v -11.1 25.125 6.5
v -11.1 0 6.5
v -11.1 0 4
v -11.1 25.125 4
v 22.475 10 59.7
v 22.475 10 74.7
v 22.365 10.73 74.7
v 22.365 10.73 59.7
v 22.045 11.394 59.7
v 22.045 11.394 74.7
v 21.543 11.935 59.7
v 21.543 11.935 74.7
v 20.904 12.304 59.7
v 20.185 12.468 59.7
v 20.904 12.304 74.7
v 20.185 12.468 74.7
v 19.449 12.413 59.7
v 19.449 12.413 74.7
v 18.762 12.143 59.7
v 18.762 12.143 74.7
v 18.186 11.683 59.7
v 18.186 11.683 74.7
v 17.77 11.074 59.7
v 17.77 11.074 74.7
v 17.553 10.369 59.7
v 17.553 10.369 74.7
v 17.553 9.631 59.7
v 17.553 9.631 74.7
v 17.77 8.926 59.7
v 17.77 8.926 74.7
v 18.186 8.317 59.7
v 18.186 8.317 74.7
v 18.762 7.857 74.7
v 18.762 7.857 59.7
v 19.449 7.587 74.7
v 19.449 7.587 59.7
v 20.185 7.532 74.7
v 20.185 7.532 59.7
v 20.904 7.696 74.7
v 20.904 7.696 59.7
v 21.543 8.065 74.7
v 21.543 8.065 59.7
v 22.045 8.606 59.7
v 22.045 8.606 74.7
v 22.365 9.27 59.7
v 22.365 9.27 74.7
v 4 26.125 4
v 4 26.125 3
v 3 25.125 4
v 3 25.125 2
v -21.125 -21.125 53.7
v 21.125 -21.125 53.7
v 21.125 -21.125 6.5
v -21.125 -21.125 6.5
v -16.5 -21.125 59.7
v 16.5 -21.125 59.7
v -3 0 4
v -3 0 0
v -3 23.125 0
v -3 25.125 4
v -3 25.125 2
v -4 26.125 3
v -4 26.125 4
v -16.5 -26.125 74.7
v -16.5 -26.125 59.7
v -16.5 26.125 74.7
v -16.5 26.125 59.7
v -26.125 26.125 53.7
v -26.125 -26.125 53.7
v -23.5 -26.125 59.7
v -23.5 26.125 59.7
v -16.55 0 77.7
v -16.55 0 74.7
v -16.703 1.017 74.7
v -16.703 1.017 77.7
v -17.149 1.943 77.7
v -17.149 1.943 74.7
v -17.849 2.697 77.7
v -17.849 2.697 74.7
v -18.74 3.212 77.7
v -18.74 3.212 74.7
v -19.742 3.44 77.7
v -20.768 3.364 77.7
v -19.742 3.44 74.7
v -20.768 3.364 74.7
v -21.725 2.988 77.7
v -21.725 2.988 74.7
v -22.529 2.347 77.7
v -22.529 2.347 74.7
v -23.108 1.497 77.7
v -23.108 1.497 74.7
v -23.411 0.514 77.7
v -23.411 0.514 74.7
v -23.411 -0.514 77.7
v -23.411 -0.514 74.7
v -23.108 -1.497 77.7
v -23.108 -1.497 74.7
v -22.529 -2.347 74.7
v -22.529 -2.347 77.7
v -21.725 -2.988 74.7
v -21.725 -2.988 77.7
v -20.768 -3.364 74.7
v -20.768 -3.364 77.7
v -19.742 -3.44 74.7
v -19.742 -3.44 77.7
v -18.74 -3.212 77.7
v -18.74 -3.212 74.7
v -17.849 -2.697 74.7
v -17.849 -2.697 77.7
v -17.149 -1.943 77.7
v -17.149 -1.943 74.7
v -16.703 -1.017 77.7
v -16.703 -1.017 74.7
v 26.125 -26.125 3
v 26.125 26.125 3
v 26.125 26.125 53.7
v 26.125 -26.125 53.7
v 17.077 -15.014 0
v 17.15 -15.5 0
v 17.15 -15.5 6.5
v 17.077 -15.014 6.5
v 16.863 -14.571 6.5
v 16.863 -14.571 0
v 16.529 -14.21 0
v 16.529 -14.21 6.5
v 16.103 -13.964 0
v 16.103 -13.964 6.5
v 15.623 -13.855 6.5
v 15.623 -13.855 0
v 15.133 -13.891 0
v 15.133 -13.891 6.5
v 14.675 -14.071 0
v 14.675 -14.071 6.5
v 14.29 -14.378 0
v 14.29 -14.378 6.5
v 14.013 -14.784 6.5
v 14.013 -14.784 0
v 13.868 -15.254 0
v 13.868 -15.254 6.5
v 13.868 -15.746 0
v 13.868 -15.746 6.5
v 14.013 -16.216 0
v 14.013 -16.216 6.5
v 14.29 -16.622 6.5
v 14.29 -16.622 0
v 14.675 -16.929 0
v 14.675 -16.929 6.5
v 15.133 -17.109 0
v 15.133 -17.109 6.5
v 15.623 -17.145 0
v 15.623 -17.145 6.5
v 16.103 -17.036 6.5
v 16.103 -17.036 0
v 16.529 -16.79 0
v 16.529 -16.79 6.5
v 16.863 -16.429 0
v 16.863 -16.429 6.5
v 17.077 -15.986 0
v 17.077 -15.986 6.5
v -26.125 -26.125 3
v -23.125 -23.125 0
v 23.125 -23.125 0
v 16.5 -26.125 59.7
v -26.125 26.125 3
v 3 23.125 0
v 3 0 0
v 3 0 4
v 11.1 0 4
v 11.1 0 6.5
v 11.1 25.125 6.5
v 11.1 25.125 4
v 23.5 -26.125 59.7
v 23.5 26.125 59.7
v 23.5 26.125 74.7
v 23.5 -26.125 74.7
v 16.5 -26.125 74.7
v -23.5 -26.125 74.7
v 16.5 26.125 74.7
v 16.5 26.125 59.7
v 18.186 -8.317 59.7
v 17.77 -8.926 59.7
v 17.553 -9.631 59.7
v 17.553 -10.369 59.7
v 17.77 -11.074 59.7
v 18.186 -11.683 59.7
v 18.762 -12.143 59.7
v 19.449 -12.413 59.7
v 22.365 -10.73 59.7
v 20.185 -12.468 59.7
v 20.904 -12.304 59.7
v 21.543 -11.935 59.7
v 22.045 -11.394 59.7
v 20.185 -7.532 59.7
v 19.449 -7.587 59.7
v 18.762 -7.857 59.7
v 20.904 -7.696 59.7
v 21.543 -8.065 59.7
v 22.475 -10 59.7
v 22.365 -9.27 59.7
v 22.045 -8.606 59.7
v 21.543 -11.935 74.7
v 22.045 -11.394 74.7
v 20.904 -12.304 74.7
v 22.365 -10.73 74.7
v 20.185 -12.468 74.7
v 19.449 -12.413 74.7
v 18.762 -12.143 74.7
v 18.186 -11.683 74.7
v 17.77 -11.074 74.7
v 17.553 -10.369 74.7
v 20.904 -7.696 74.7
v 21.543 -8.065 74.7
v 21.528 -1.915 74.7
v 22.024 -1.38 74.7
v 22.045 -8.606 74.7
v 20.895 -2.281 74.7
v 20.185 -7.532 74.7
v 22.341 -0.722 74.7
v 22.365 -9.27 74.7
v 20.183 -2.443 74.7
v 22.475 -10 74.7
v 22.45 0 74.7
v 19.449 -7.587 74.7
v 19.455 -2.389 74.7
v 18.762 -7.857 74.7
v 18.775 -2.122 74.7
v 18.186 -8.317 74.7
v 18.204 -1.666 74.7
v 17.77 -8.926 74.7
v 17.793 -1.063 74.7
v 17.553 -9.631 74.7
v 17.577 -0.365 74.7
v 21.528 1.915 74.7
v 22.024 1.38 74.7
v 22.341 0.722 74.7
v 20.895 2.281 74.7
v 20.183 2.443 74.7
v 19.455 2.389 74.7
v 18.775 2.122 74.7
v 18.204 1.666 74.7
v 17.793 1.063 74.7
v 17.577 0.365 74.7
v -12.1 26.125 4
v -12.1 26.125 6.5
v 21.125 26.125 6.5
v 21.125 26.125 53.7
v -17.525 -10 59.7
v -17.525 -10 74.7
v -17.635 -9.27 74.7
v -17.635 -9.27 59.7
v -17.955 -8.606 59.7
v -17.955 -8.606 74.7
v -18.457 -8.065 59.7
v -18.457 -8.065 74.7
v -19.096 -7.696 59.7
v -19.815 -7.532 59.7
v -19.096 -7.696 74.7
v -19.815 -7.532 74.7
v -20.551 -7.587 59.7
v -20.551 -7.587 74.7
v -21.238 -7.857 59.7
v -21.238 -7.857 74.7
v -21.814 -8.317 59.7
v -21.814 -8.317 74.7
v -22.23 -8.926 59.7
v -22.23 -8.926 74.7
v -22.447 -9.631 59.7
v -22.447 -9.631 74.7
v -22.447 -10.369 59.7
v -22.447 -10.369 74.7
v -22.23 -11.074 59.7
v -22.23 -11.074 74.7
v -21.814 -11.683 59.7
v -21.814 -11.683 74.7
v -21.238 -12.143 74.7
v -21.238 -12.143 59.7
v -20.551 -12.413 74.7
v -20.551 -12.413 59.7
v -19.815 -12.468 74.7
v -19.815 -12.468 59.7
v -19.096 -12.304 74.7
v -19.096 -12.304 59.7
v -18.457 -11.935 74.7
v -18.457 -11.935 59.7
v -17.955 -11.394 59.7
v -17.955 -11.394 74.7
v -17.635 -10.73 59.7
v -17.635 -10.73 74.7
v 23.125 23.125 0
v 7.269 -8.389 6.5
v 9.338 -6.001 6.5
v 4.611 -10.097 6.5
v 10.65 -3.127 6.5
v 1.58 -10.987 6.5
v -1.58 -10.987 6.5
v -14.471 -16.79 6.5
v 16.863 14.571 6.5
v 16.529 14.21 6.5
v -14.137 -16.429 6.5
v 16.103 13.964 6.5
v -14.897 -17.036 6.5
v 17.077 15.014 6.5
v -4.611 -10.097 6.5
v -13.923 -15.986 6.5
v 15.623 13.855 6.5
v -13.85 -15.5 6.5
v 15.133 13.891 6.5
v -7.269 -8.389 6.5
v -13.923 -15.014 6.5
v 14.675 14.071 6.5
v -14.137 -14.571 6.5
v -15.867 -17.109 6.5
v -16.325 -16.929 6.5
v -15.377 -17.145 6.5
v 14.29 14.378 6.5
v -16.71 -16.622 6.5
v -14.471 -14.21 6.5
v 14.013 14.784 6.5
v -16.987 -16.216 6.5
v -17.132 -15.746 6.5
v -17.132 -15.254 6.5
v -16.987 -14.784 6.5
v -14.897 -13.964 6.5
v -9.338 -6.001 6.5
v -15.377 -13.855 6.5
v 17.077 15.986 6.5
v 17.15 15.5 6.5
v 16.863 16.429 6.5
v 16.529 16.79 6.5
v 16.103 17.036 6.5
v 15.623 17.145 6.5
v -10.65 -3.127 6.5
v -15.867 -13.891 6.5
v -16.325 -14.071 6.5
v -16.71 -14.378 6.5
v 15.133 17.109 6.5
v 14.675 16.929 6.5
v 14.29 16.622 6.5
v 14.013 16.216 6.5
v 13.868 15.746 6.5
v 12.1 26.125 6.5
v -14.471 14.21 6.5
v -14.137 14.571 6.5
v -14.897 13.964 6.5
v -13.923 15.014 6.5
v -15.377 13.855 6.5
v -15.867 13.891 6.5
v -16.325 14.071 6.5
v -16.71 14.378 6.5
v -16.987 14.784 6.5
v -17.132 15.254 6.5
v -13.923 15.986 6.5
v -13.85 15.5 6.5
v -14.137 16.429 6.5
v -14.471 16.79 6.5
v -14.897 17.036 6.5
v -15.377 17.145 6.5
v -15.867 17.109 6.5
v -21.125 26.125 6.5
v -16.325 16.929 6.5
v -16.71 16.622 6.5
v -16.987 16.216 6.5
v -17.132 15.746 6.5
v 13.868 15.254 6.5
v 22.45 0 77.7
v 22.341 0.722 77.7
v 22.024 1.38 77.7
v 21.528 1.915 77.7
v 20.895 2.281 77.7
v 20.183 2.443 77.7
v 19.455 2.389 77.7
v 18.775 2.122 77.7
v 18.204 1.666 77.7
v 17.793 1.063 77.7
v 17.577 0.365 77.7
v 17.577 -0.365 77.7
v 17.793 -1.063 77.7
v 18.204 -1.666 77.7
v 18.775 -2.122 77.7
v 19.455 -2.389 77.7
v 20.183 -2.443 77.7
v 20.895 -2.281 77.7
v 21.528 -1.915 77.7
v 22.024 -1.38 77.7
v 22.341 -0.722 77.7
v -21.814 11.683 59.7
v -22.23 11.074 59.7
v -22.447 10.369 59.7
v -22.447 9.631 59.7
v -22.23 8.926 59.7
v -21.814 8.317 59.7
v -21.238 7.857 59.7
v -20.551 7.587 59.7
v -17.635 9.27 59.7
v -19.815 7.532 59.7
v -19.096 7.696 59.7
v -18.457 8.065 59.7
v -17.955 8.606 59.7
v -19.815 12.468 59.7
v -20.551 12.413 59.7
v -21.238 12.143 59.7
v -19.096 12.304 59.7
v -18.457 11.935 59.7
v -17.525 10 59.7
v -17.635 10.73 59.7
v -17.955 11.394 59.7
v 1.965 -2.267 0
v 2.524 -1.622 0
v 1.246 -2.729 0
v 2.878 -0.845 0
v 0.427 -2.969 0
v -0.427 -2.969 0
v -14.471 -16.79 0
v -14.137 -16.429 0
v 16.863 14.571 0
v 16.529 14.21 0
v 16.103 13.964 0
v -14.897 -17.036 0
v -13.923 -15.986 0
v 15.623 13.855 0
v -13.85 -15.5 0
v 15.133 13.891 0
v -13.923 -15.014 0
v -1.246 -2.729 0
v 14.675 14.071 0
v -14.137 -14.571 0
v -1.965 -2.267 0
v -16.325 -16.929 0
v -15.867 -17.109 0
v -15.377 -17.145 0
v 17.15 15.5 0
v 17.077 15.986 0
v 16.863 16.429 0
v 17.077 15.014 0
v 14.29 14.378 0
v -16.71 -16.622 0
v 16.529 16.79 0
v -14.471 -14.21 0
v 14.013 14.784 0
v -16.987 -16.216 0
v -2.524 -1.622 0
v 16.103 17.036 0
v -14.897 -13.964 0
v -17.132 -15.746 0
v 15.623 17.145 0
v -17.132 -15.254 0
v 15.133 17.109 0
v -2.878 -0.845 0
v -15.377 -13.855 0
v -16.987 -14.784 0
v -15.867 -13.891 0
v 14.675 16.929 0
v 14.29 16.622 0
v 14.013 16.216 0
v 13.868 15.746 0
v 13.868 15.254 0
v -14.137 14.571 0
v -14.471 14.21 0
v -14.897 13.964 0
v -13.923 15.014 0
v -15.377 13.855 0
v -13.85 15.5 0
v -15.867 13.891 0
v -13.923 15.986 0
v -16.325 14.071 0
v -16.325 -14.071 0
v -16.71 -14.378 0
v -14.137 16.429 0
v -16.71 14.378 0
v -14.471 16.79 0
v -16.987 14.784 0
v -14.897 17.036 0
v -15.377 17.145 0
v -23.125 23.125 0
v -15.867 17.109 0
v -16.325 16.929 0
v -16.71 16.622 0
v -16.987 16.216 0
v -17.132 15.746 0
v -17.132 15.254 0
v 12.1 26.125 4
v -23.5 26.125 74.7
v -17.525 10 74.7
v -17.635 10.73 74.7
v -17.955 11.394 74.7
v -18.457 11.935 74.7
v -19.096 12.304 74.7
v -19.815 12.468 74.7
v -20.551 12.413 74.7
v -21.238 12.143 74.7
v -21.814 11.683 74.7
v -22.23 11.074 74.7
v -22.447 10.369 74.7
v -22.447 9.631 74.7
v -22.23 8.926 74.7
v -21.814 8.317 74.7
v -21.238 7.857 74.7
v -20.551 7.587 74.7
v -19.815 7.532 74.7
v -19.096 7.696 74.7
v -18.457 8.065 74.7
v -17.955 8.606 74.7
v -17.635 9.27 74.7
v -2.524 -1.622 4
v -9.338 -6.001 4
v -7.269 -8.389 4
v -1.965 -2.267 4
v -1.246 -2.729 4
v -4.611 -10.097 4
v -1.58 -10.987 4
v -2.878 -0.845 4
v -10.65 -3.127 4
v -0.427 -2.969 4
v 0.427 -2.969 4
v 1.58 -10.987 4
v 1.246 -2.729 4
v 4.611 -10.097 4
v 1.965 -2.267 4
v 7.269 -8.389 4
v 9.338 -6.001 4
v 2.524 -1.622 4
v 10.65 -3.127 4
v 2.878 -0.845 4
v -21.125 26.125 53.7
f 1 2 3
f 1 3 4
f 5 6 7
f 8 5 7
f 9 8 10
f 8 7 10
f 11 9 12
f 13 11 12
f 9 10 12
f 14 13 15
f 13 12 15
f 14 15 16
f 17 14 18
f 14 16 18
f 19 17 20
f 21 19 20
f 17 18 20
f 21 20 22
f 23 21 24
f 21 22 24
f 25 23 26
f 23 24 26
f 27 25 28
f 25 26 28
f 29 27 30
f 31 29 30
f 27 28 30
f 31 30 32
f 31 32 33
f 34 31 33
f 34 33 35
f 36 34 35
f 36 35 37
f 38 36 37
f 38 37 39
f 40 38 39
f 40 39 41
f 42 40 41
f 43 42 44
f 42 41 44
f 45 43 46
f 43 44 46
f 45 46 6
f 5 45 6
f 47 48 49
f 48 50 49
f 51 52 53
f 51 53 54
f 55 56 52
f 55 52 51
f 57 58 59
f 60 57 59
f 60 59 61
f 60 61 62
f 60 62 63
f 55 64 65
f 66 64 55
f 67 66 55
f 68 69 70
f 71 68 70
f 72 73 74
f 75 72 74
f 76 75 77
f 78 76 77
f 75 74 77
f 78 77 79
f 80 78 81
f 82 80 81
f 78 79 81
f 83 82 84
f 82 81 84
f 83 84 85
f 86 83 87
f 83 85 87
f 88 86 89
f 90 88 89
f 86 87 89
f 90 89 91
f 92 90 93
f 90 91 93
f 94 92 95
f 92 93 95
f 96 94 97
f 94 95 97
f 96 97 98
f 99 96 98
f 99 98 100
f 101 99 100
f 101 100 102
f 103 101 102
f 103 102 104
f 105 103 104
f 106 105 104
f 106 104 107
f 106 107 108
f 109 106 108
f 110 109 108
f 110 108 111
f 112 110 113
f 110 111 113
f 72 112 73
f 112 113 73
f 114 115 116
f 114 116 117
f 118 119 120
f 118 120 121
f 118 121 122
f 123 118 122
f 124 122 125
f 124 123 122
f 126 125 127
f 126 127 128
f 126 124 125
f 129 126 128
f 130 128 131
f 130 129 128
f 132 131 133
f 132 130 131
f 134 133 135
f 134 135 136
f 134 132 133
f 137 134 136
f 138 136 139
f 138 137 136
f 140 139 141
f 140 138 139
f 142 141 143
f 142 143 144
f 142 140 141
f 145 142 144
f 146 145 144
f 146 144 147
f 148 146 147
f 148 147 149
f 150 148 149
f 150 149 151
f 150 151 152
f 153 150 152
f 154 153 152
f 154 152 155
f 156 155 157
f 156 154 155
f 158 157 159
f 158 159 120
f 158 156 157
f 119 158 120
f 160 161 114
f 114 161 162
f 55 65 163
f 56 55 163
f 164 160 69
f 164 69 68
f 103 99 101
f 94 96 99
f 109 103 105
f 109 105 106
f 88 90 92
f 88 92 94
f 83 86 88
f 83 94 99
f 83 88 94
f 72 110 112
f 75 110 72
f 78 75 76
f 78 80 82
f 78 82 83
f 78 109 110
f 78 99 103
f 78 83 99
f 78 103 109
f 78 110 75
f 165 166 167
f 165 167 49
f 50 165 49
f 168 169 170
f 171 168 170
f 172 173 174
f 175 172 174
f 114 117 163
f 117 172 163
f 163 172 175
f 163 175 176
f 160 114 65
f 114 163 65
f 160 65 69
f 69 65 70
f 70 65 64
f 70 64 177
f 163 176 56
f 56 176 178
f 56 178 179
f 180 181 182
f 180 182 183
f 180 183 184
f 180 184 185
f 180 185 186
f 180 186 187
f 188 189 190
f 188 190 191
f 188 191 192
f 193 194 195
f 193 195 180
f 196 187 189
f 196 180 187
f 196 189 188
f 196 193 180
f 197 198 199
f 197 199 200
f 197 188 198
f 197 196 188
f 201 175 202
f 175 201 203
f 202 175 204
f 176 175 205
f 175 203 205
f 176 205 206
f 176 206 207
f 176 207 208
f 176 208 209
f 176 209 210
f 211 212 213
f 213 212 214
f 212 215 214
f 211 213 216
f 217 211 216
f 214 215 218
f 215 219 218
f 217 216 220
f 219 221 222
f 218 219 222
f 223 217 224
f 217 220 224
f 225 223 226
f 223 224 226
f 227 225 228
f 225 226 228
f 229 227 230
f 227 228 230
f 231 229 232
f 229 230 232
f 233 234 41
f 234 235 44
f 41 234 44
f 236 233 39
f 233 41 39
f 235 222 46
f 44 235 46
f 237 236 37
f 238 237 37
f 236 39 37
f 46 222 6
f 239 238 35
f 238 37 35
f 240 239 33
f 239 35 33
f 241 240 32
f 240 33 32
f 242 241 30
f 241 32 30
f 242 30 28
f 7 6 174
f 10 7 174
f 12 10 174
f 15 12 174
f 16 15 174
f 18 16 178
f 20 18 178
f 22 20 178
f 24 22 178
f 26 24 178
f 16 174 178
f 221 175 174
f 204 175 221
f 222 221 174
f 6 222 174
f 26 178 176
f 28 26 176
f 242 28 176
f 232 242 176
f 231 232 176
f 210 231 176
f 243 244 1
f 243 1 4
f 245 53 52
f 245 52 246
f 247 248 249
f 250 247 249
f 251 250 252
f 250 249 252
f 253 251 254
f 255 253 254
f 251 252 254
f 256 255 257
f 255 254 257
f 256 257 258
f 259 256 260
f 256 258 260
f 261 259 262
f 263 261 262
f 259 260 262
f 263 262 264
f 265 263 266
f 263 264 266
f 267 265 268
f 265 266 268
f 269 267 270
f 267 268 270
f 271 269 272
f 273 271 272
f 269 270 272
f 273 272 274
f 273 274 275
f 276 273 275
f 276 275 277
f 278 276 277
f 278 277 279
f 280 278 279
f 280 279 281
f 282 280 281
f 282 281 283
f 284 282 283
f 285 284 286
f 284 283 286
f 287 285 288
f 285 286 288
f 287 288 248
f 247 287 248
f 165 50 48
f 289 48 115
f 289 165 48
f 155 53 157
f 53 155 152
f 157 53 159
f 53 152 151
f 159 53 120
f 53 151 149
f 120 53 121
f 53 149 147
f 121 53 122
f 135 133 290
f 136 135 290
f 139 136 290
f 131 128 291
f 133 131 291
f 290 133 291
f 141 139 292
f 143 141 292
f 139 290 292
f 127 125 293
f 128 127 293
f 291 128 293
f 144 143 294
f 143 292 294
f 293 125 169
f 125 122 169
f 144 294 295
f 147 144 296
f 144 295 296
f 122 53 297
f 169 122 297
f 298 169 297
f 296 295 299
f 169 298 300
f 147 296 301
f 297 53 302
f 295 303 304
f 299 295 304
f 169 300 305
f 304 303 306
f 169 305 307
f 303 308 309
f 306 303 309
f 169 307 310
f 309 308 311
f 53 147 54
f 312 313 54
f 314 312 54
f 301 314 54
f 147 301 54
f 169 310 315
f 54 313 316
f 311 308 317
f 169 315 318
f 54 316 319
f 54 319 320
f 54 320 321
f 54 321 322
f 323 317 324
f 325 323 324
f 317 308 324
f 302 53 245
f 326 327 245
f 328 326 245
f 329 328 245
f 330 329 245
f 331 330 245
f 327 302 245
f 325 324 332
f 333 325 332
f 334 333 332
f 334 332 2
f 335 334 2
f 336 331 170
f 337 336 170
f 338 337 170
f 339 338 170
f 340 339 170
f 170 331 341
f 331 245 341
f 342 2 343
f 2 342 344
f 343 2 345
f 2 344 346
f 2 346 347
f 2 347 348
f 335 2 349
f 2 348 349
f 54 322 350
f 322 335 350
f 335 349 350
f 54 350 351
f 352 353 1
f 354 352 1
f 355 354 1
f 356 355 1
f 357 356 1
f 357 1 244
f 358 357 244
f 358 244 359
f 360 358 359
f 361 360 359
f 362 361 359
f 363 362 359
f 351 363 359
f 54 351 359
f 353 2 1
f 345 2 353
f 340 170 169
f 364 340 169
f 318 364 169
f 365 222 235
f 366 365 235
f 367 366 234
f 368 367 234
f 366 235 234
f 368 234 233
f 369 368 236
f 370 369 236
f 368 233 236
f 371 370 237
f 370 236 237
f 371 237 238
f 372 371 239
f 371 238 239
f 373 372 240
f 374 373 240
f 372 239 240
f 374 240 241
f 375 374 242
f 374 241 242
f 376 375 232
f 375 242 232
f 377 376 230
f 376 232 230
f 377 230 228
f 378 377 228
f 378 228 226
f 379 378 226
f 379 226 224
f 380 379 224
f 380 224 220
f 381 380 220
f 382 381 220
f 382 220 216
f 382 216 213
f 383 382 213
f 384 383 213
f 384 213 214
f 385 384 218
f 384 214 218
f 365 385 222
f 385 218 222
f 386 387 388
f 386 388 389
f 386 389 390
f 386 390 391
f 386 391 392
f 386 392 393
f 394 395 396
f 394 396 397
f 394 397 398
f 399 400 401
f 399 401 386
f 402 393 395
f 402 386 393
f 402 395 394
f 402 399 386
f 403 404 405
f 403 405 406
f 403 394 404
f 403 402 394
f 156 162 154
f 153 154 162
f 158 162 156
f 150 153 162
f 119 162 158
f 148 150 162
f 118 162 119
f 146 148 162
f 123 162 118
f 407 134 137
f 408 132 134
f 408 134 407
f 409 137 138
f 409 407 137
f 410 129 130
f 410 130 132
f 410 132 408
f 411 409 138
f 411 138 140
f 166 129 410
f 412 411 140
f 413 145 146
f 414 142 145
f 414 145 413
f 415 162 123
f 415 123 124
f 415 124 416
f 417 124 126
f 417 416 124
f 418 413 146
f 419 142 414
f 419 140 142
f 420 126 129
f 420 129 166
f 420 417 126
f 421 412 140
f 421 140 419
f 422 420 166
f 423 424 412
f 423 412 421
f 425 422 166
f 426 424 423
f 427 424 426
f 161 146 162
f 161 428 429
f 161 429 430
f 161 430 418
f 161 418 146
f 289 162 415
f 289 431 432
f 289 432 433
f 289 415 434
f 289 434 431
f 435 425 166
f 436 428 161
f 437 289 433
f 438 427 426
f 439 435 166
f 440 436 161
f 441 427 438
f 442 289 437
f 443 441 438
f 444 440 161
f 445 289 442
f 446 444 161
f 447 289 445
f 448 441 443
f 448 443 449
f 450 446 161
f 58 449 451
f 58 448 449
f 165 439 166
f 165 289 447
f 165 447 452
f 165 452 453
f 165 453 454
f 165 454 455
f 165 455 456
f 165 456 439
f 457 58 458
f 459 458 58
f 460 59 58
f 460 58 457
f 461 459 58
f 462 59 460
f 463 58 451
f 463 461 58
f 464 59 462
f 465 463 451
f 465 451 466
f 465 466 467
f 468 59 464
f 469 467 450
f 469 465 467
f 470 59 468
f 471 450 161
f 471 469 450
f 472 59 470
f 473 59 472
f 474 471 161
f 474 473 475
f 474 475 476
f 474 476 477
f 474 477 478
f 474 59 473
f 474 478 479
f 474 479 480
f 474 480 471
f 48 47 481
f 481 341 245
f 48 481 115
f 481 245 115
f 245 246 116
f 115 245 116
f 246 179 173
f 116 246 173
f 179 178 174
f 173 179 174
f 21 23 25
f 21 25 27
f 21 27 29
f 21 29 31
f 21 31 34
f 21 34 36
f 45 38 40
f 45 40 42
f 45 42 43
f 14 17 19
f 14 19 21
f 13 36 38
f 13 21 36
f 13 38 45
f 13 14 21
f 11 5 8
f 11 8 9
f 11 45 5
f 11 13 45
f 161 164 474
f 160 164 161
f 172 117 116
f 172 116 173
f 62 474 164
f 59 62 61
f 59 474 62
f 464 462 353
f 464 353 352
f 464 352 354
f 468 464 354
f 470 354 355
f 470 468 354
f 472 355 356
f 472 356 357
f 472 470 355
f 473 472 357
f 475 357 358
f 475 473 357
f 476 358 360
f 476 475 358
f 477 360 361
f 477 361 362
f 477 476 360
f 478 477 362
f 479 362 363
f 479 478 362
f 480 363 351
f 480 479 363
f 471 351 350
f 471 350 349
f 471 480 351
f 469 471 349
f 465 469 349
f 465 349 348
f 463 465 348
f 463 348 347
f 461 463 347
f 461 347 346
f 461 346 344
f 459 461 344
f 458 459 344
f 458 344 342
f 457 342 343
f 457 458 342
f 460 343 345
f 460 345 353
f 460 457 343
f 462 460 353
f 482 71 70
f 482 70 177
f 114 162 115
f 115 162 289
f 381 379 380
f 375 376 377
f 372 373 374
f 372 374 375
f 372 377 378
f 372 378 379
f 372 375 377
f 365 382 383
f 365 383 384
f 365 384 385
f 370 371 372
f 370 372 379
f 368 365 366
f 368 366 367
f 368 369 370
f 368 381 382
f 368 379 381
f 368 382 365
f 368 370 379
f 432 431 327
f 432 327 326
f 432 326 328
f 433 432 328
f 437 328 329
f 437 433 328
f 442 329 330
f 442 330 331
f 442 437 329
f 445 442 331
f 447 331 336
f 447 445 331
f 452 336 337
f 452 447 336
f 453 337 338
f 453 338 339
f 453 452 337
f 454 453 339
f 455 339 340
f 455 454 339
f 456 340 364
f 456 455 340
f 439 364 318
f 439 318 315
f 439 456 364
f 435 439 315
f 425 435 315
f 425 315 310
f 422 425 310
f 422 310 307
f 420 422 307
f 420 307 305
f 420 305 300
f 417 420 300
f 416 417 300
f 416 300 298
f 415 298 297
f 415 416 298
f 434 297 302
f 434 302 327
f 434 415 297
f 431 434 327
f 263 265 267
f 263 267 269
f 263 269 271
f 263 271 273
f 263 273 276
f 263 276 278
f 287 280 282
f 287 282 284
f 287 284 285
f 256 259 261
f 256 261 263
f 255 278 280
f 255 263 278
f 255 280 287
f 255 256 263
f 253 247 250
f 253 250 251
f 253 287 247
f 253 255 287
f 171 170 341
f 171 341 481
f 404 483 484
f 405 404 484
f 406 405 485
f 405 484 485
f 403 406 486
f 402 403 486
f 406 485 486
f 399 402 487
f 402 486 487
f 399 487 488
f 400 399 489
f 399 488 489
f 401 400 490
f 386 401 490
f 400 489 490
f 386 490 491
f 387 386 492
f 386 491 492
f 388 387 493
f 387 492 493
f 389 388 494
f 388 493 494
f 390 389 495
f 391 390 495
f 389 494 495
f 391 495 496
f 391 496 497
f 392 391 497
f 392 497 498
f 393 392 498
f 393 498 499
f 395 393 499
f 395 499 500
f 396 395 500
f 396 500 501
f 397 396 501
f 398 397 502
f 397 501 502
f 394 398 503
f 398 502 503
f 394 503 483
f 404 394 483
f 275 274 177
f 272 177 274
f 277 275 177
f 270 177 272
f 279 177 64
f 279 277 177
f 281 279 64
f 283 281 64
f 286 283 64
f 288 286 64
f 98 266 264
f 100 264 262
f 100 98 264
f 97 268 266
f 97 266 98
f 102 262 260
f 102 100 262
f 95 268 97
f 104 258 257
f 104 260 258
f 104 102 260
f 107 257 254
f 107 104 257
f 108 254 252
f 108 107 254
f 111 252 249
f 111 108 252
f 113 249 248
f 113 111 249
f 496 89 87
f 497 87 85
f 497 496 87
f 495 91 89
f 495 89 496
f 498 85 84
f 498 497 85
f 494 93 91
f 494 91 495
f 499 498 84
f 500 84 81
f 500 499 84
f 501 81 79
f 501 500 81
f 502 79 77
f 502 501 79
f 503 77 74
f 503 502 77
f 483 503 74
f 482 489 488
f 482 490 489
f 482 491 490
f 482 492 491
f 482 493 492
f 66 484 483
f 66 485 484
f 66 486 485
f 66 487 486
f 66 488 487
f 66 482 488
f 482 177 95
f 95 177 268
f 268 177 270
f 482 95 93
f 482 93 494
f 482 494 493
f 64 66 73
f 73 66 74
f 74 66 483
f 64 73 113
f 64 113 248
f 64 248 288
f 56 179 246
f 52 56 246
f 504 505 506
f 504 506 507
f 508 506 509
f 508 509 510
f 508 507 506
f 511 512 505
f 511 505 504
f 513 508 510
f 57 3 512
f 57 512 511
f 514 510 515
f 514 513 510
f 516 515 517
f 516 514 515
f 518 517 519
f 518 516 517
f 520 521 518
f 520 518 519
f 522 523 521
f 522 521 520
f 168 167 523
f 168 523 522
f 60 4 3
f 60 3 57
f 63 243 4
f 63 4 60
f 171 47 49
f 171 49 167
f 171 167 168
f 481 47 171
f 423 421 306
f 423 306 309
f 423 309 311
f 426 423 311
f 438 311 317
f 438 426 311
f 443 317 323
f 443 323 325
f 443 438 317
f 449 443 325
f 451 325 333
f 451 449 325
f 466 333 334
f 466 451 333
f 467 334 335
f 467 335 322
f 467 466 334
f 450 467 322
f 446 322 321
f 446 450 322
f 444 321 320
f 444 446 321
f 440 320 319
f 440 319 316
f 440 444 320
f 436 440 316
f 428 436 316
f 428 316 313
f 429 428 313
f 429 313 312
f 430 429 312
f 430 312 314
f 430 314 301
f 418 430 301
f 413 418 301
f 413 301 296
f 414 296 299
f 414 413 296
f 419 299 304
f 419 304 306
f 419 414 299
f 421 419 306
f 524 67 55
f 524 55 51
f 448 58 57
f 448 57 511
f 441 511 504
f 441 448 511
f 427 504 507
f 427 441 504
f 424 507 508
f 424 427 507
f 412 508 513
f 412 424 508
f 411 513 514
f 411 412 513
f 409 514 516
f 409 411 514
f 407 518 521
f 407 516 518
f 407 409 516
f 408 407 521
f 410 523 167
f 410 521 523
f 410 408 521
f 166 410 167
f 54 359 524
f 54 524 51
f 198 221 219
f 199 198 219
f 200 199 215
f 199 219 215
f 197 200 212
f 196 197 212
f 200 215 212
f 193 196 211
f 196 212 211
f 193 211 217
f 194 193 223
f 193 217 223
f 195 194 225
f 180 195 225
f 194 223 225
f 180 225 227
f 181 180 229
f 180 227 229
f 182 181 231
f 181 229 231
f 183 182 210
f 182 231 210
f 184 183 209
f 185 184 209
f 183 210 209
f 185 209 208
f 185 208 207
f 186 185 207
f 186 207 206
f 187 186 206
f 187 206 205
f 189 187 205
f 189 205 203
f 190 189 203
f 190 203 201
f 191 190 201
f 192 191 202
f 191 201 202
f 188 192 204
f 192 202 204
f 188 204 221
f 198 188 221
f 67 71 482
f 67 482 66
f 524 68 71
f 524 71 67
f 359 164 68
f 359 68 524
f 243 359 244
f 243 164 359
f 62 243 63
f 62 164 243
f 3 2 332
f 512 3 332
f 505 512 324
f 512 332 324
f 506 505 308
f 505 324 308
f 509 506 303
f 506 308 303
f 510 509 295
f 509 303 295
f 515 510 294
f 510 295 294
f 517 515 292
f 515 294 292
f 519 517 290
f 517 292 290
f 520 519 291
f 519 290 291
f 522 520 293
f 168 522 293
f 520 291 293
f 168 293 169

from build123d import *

# Parameters (mm, degrees)
SKETCH_R        = 1.65
PAD_DEPTH       = 6.5
POCKET_DEPTH    = 2.5
PAD001_DEPTH    = 47.2
CHAMFER_SIZE    = 1
PAD002_DEPTH    = 52.25
SKETCH004_R     = 2.475
POCKET001_DEPTH = 15
PAD003_DEPTH    = 5
SKETCH006_R     = 3.45
SKETCH006_R_2   = 2.45
PAD004_DEPTH    = 3
CHAMFER001_SIZE = 3


with BuildPart() as part:
    # Sketch → Pad (new body)
    with BuildSketch(Plane.XY):
        with BuildLine():
            ThreePointArc((-3, 0), (0, -3), (3, 0))
            Line((3, 0), (3, 26.125))
            Line((3, 26.125), (26.125, 26.125))
            Line((26.125, -26.125), (26.125, 26.125))
            Line((-26.125, -26.125), (26.125, -26.125))
            Line((-26.125, 26.125), (-26.125, -26.125))
            Line((-26.125, 26.125), (-3, 26.125))
            Line((-3, 0), (-3, 26.125))
        make_face()
        with Locations((-15.5, -15.5)):
            Circle(SKETCH_R, mode=Mode.SUBTRACT)
        with Locations((15.5, -15.5)):
            Circle(SKETCH_R, mode=Mode.SUBTRACT)
        with Locations((15.5, 15.5)):
            Circle(SKETCH_R, mode=Mode.SUBTRACT)
        with Locations((-15.5, 15.5)):
            Circle(SKETCH_R, mode=Mode.SUBTRACT)
    extrude(amount=PAD_DEPTH)

    # Sketch001 (on Face14 of Pad) → Pocket (cut)
    with BuildSketch(Plane.XY.offset(6.5)):
        with BuildLine():
            ThreePointArc((-11.1, 0), (0, -11.1), (11.1, 0))
            Line((11.1, 0), (11.1, 26.125))
            Line((-11.1, 26.125), (11.1, 26.125))
            Line((-11.1, 0), (-11.1, 26.125))
        make_face()
    extrude(amount=-POCKET_DEPTH, mode=Mode.SUBTRACT)

    # Sketch002 (on Face6 of Pocket) → Pad001 (join)
    with BuildSketch(Plane.XY.offset(6.5)):
        Polygon((-26.125, -26.125), (-26.125, 26.125), (-21.125, 26.125), (-21.125, -21.125), (21.125, -21.125), (21.125, 26.125), (26.125, 26.125), (26.125, -26.125), align=None)
    extrude(amount=PAD001_DEPTH)

    # Chamfer
    chamfer_edges = [part.edges().sort_by_distance(p)[0] for p in [
        (3, 26.125, 2),
        (11.1, 26.125, 5.25),
        (-3, 26.125, 2),
        (-11.1, 26.125, 5.25),
    ]]
    chamfer(chamfer_edges, length=CHAMFER_SIZE)

    # Sketch003 (on Face10 of Chamfer) → Pad002 (join)
    with BuildSketch(Plane(origin=(0, 26.125, 0), x_dir=(-1, 0, 0), z_dir=(0, 1, 0))):
        Polygon((-26.125, 53.7), (-23.5, 59.7), (-23.5, 74.7), (-16.5, 74.7), (-16.5, 59.7), (-21.125, 53.7), align=None)
        Polygon((26.125, 53.7), (23.5, 59.7), (23.5, 74.7), (16.5, 74.7), (16.5, 59.7), (21.125, 53.7), align=None)
    extrude(amount=-PAD002_DEPTH)

    # Sketch004 (on Face32 of Pad002) → Pocket001 (cut)
    with BuildSketch(Plane.XY.offset(74.7)):
        with Locations((-20, 10)):
            Circle(SKETCH004_R)
        with Locations((-20, -10)):
            Circle(SKETCH004_R)
        with Locations((20, -10)):
            Circle(SKETCH004_R)
        with Locations((20, 10)):
            Circle(SKETCH004_R)
    extrude(amount=-POCKET001_DEPTH, mode=Mode.SUBTRACT)

    # Sketch005 (on Face6 of Pocket001) → Pad003 (join)
    with BuildSketch(Plane.XZ.offset(26.125)):
        Polygon((-16.5, 59.7), (16.5, 59.7), (21.125, 53.7), (-21.125, 53.7), align=None)
    extrude(amount=-PAD003_DEPTH)

    # Sketch006 (on Face17 of Pad003) → Pad004 (join)
    with BuildSketch(Plane.XY.offset(74.7)):
        with Locations((-20, 0)):
            Circle(SKETCH006_R)
        with Locations((20, 0)):
            Circle(SKETCH006_R_2)
    extrude(amount=PAD004_DEPTH)

    # Chamfer001
    chamfer001_edges = [part.edges().sort_by_distance(p)[0] for p in [
        (26.125, 0, 0),
        (15.0625, 26.125, 0),
        (-15.0625, 26.125, 0),
        (-26.125, 0, 0),
        (0, -26.125, 0),
    ]]
    chamfer(chamfer001_edges, length=CHAMFER001_SIZE)


solid = part.part
